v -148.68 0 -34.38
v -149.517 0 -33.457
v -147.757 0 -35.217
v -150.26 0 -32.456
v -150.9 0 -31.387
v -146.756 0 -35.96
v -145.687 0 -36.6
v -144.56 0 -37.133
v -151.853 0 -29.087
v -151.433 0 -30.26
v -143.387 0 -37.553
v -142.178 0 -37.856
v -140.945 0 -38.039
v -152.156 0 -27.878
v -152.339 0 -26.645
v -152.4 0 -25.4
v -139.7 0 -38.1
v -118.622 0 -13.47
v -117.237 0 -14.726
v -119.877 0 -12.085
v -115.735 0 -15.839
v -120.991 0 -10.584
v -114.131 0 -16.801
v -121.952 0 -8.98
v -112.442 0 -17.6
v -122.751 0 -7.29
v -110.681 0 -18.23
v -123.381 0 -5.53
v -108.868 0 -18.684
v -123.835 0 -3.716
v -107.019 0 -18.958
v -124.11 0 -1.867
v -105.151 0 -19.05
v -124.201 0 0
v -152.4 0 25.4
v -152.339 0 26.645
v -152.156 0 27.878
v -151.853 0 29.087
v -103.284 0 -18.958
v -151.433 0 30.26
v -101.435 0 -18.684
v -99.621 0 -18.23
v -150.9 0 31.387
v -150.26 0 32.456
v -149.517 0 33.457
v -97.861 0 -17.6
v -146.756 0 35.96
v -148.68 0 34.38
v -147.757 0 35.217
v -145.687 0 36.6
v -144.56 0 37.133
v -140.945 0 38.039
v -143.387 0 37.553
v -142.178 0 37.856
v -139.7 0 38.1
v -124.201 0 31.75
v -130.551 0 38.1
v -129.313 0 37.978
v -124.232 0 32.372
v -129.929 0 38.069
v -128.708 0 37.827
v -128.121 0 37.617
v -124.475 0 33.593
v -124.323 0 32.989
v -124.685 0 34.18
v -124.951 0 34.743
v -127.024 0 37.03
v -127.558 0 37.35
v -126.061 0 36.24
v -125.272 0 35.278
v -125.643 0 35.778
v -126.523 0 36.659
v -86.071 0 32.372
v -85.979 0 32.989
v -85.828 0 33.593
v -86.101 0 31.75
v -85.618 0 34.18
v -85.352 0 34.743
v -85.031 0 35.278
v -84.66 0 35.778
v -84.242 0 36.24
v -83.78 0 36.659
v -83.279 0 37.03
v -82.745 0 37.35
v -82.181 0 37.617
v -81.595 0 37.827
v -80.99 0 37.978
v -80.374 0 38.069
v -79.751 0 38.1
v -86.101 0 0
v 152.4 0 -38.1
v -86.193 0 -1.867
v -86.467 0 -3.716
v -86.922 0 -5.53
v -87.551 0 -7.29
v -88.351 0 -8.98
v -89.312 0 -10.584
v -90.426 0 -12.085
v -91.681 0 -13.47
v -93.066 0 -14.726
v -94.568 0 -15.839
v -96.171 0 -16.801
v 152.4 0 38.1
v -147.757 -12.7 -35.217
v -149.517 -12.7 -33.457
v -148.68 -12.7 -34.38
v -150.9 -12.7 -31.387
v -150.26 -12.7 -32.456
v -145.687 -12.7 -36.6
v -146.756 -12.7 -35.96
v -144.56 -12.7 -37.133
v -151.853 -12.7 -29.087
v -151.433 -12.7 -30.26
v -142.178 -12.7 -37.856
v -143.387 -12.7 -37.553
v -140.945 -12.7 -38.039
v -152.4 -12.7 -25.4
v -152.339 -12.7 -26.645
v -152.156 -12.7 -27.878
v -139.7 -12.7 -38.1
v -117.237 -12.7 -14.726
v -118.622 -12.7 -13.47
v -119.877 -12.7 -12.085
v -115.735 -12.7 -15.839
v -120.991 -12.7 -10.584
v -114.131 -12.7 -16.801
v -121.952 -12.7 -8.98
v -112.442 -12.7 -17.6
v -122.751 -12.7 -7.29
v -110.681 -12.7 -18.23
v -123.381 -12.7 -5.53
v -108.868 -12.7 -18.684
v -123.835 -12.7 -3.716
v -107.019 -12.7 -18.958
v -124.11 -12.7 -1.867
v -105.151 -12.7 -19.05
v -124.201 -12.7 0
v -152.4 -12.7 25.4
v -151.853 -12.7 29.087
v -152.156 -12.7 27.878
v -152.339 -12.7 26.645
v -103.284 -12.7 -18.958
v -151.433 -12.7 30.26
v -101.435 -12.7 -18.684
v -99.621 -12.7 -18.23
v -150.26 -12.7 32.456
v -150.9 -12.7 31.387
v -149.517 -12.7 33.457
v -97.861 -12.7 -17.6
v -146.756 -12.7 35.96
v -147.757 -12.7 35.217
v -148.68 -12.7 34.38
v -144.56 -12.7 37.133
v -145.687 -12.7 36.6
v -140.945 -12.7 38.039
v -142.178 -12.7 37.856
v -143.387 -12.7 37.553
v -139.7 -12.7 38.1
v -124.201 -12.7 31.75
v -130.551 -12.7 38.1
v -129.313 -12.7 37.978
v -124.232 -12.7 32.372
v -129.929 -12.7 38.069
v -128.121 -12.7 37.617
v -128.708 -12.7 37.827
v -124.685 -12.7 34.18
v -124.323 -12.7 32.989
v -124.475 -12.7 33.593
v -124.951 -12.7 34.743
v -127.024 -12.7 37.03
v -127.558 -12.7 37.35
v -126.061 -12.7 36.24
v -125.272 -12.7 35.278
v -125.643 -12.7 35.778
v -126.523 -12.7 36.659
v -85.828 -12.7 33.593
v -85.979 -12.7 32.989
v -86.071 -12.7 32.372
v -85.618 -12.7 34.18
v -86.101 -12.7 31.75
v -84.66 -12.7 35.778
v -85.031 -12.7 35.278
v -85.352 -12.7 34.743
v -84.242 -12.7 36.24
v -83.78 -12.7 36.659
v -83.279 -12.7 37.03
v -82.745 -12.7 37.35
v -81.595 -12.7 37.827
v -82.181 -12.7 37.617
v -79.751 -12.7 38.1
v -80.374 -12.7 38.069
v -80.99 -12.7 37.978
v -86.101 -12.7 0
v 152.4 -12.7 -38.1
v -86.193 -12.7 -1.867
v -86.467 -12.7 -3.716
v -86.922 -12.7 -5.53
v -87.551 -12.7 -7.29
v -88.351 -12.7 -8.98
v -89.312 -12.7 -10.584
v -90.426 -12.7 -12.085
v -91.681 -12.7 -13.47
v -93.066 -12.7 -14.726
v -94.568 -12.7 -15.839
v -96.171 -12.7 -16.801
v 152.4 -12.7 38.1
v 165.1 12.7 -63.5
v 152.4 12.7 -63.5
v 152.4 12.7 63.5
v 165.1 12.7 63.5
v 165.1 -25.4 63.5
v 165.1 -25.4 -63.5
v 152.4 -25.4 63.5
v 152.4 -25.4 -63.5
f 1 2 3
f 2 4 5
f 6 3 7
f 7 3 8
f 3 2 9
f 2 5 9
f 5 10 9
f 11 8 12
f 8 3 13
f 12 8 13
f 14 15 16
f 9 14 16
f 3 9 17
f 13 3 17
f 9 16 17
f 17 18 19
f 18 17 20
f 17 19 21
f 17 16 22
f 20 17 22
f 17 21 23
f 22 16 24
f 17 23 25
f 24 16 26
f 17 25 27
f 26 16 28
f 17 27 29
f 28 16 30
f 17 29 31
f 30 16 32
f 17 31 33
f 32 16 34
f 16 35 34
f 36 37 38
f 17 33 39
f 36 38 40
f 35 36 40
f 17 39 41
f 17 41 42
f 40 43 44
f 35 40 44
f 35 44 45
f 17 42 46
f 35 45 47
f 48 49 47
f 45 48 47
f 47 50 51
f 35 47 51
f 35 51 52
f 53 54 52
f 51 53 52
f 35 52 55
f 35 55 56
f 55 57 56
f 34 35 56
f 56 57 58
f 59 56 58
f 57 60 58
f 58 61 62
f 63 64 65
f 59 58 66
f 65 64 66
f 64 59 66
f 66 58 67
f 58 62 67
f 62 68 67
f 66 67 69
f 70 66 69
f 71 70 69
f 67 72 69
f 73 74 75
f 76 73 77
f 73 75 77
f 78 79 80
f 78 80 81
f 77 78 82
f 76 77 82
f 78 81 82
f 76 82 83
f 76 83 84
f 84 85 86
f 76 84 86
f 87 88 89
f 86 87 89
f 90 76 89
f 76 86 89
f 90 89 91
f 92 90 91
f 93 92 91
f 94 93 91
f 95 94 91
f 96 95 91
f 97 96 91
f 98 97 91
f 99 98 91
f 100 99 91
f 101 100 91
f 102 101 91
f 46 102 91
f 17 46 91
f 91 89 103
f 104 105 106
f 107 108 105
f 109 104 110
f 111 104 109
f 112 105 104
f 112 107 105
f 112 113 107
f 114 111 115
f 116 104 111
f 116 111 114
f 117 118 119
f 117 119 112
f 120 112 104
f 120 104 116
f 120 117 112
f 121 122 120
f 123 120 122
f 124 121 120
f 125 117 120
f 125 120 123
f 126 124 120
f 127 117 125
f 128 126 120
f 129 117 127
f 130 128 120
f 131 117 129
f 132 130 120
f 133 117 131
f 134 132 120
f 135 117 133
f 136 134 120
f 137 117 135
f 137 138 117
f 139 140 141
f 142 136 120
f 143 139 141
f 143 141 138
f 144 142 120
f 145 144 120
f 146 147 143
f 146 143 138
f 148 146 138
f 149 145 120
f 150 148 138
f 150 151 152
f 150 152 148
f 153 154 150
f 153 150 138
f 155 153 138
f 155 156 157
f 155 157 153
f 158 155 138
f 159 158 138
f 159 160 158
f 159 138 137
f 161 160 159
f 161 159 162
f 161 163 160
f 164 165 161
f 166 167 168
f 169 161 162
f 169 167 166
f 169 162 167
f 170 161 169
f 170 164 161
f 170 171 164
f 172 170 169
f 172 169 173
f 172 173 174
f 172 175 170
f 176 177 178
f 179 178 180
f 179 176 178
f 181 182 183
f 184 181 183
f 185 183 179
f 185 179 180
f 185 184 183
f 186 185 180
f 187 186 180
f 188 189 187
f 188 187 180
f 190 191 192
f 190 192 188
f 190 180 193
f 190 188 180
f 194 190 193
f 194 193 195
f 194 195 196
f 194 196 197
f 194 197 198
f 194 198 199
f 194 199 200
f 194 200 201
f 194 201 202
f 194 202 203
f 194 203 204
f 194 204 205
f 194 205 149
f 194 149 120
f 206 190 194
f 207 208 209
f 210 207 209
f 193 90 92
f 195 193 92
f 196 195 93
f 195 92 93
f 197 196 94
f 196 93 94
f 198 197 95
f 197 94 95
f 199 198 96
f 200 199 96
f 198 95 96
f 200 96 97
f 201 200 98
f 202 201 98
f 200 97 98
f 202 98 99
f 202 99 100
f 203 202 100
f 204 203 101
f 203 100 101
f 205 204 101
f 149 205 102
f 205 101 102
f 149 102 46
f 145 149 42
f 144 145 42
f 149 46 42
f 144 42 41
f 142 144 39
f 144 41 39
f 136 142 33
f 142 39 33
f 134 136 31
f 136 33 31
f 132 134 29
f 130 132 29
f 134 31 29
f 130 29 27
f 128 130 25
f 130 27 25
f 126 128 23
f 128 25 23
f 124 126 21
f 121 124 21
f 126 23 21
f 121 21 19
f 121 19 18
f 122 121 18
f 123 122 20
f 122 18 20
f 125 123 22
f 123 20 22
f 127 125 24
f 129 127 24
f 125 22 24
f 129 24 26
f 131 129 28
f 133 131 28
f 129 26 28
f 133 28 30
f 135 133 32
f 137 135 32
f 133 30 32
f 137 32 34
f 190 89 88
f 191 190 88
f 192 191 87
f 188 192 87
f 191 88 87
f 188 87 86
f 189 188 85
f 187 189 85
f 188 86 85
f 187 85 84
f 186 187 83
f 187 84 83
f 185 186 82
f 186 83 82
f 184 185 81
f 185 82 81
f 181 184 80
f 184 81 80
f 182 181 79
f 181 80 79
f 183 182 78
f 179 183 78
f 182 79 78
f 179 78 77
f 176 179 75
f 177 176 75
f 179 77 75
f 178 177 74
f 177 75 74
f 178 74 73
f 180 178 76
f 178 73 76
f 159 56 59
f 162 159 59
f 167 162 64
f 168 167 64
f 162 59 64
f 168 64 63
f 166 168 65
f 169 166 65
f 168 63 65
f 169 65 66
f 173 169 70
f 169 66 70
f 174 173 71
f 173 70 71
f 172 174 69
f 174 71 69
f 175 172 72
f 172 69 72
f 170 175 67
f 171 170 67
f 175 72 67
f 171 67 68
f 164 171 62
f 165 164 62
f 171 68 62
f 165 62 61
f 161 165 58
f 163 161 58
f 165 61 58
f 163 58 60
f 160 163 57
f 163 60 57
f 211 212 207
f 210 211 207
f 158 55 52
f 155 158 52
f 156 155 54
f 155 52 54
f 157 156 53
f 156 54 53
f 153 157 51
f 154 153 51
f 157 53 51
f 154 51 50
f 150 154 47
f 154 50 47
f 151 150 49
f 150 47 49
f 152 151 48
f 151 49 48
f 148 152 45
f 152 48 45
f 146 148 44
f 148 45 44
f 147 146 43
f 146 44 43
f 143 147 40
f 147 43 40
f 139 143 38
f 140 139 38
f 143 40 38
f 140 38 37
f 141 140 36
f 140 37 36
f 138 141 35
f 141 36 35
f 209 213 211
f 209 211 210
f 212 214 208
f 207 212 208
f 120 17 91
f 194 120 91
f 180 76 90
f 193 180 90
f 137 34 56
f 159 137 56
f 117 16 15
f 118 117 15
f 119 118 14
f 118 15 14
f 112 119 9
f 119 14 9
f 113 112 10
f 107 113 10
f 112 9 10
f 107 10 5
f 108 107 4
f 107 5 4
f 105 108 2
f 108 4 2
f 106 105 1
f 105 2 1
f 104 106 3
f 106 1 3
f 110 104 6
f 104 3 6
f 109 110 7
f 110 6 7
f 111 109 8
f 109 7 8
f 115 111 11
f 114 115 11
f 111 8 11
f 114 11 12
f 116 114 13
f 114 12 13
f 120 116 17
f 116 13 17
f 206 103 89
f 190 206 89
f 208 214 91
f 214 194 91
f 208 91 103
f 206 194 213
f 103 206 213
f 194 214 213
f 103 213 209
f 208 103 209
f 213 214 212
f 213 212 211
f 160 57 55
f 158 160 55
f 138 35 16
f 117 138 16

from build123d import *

# Parameters (mm, degrees)
F1_DEPTH = 12.7
F2_W     = 38.1
F2_H     = 127
F3_DEPTH = 12.7


with BuildPart() as f1:
    # F0 (on Front) → F1 (new body)
    with BuildSketch(Plane.XZ):
        with BuildLine():
            Line((-139.7, -38.1), (152.4, -38.1))
            Line((152.4, -38.1), (152.4, 38.1))
            Line((152.4, 38.1), (-79.751387, 38.1))
            ThreePointArc((-79.751387, 38.1), (-84.241515, 36.240128), (-86.101387, 31.75))
            Line((-86.101387, 31.75), (-86.101387, 0))
            ThreePointArc((-86.101387, 0), (-105.151387, -19.05), (-124.201387, 0))
            Line((-124.201387, 0), (-124.201387, 31.75))
            ThreePointArc((-124.201387, 31.75), (-126.061259, 36.240128), (-130.551387, 38.1))
            Line((-130.551387, 38.1), (-139.7, 38.1))
            ThreePointArc((-139.7, 38.1), (-148.680256, 34.380256), (-152.4, 25.4))
            Line((-152.4, 25.4), (-152.4, -25.4))
            ThreePointArc((-152.4, -25.4), (-148.680256, -34.380256), (-139.7, -38.1))
        make_face()
    extrude(amount=F1_DEPTH)

    # F2 (on face) → F3 (join)
    with BuildSketch(Plane.YZ.offset(152.4)):
        with Locations((-6.35, 0)):
            Rectangle(F2_W, F2_H)
    extrude(amount=F3_DEPTH)


solid = f1.part
